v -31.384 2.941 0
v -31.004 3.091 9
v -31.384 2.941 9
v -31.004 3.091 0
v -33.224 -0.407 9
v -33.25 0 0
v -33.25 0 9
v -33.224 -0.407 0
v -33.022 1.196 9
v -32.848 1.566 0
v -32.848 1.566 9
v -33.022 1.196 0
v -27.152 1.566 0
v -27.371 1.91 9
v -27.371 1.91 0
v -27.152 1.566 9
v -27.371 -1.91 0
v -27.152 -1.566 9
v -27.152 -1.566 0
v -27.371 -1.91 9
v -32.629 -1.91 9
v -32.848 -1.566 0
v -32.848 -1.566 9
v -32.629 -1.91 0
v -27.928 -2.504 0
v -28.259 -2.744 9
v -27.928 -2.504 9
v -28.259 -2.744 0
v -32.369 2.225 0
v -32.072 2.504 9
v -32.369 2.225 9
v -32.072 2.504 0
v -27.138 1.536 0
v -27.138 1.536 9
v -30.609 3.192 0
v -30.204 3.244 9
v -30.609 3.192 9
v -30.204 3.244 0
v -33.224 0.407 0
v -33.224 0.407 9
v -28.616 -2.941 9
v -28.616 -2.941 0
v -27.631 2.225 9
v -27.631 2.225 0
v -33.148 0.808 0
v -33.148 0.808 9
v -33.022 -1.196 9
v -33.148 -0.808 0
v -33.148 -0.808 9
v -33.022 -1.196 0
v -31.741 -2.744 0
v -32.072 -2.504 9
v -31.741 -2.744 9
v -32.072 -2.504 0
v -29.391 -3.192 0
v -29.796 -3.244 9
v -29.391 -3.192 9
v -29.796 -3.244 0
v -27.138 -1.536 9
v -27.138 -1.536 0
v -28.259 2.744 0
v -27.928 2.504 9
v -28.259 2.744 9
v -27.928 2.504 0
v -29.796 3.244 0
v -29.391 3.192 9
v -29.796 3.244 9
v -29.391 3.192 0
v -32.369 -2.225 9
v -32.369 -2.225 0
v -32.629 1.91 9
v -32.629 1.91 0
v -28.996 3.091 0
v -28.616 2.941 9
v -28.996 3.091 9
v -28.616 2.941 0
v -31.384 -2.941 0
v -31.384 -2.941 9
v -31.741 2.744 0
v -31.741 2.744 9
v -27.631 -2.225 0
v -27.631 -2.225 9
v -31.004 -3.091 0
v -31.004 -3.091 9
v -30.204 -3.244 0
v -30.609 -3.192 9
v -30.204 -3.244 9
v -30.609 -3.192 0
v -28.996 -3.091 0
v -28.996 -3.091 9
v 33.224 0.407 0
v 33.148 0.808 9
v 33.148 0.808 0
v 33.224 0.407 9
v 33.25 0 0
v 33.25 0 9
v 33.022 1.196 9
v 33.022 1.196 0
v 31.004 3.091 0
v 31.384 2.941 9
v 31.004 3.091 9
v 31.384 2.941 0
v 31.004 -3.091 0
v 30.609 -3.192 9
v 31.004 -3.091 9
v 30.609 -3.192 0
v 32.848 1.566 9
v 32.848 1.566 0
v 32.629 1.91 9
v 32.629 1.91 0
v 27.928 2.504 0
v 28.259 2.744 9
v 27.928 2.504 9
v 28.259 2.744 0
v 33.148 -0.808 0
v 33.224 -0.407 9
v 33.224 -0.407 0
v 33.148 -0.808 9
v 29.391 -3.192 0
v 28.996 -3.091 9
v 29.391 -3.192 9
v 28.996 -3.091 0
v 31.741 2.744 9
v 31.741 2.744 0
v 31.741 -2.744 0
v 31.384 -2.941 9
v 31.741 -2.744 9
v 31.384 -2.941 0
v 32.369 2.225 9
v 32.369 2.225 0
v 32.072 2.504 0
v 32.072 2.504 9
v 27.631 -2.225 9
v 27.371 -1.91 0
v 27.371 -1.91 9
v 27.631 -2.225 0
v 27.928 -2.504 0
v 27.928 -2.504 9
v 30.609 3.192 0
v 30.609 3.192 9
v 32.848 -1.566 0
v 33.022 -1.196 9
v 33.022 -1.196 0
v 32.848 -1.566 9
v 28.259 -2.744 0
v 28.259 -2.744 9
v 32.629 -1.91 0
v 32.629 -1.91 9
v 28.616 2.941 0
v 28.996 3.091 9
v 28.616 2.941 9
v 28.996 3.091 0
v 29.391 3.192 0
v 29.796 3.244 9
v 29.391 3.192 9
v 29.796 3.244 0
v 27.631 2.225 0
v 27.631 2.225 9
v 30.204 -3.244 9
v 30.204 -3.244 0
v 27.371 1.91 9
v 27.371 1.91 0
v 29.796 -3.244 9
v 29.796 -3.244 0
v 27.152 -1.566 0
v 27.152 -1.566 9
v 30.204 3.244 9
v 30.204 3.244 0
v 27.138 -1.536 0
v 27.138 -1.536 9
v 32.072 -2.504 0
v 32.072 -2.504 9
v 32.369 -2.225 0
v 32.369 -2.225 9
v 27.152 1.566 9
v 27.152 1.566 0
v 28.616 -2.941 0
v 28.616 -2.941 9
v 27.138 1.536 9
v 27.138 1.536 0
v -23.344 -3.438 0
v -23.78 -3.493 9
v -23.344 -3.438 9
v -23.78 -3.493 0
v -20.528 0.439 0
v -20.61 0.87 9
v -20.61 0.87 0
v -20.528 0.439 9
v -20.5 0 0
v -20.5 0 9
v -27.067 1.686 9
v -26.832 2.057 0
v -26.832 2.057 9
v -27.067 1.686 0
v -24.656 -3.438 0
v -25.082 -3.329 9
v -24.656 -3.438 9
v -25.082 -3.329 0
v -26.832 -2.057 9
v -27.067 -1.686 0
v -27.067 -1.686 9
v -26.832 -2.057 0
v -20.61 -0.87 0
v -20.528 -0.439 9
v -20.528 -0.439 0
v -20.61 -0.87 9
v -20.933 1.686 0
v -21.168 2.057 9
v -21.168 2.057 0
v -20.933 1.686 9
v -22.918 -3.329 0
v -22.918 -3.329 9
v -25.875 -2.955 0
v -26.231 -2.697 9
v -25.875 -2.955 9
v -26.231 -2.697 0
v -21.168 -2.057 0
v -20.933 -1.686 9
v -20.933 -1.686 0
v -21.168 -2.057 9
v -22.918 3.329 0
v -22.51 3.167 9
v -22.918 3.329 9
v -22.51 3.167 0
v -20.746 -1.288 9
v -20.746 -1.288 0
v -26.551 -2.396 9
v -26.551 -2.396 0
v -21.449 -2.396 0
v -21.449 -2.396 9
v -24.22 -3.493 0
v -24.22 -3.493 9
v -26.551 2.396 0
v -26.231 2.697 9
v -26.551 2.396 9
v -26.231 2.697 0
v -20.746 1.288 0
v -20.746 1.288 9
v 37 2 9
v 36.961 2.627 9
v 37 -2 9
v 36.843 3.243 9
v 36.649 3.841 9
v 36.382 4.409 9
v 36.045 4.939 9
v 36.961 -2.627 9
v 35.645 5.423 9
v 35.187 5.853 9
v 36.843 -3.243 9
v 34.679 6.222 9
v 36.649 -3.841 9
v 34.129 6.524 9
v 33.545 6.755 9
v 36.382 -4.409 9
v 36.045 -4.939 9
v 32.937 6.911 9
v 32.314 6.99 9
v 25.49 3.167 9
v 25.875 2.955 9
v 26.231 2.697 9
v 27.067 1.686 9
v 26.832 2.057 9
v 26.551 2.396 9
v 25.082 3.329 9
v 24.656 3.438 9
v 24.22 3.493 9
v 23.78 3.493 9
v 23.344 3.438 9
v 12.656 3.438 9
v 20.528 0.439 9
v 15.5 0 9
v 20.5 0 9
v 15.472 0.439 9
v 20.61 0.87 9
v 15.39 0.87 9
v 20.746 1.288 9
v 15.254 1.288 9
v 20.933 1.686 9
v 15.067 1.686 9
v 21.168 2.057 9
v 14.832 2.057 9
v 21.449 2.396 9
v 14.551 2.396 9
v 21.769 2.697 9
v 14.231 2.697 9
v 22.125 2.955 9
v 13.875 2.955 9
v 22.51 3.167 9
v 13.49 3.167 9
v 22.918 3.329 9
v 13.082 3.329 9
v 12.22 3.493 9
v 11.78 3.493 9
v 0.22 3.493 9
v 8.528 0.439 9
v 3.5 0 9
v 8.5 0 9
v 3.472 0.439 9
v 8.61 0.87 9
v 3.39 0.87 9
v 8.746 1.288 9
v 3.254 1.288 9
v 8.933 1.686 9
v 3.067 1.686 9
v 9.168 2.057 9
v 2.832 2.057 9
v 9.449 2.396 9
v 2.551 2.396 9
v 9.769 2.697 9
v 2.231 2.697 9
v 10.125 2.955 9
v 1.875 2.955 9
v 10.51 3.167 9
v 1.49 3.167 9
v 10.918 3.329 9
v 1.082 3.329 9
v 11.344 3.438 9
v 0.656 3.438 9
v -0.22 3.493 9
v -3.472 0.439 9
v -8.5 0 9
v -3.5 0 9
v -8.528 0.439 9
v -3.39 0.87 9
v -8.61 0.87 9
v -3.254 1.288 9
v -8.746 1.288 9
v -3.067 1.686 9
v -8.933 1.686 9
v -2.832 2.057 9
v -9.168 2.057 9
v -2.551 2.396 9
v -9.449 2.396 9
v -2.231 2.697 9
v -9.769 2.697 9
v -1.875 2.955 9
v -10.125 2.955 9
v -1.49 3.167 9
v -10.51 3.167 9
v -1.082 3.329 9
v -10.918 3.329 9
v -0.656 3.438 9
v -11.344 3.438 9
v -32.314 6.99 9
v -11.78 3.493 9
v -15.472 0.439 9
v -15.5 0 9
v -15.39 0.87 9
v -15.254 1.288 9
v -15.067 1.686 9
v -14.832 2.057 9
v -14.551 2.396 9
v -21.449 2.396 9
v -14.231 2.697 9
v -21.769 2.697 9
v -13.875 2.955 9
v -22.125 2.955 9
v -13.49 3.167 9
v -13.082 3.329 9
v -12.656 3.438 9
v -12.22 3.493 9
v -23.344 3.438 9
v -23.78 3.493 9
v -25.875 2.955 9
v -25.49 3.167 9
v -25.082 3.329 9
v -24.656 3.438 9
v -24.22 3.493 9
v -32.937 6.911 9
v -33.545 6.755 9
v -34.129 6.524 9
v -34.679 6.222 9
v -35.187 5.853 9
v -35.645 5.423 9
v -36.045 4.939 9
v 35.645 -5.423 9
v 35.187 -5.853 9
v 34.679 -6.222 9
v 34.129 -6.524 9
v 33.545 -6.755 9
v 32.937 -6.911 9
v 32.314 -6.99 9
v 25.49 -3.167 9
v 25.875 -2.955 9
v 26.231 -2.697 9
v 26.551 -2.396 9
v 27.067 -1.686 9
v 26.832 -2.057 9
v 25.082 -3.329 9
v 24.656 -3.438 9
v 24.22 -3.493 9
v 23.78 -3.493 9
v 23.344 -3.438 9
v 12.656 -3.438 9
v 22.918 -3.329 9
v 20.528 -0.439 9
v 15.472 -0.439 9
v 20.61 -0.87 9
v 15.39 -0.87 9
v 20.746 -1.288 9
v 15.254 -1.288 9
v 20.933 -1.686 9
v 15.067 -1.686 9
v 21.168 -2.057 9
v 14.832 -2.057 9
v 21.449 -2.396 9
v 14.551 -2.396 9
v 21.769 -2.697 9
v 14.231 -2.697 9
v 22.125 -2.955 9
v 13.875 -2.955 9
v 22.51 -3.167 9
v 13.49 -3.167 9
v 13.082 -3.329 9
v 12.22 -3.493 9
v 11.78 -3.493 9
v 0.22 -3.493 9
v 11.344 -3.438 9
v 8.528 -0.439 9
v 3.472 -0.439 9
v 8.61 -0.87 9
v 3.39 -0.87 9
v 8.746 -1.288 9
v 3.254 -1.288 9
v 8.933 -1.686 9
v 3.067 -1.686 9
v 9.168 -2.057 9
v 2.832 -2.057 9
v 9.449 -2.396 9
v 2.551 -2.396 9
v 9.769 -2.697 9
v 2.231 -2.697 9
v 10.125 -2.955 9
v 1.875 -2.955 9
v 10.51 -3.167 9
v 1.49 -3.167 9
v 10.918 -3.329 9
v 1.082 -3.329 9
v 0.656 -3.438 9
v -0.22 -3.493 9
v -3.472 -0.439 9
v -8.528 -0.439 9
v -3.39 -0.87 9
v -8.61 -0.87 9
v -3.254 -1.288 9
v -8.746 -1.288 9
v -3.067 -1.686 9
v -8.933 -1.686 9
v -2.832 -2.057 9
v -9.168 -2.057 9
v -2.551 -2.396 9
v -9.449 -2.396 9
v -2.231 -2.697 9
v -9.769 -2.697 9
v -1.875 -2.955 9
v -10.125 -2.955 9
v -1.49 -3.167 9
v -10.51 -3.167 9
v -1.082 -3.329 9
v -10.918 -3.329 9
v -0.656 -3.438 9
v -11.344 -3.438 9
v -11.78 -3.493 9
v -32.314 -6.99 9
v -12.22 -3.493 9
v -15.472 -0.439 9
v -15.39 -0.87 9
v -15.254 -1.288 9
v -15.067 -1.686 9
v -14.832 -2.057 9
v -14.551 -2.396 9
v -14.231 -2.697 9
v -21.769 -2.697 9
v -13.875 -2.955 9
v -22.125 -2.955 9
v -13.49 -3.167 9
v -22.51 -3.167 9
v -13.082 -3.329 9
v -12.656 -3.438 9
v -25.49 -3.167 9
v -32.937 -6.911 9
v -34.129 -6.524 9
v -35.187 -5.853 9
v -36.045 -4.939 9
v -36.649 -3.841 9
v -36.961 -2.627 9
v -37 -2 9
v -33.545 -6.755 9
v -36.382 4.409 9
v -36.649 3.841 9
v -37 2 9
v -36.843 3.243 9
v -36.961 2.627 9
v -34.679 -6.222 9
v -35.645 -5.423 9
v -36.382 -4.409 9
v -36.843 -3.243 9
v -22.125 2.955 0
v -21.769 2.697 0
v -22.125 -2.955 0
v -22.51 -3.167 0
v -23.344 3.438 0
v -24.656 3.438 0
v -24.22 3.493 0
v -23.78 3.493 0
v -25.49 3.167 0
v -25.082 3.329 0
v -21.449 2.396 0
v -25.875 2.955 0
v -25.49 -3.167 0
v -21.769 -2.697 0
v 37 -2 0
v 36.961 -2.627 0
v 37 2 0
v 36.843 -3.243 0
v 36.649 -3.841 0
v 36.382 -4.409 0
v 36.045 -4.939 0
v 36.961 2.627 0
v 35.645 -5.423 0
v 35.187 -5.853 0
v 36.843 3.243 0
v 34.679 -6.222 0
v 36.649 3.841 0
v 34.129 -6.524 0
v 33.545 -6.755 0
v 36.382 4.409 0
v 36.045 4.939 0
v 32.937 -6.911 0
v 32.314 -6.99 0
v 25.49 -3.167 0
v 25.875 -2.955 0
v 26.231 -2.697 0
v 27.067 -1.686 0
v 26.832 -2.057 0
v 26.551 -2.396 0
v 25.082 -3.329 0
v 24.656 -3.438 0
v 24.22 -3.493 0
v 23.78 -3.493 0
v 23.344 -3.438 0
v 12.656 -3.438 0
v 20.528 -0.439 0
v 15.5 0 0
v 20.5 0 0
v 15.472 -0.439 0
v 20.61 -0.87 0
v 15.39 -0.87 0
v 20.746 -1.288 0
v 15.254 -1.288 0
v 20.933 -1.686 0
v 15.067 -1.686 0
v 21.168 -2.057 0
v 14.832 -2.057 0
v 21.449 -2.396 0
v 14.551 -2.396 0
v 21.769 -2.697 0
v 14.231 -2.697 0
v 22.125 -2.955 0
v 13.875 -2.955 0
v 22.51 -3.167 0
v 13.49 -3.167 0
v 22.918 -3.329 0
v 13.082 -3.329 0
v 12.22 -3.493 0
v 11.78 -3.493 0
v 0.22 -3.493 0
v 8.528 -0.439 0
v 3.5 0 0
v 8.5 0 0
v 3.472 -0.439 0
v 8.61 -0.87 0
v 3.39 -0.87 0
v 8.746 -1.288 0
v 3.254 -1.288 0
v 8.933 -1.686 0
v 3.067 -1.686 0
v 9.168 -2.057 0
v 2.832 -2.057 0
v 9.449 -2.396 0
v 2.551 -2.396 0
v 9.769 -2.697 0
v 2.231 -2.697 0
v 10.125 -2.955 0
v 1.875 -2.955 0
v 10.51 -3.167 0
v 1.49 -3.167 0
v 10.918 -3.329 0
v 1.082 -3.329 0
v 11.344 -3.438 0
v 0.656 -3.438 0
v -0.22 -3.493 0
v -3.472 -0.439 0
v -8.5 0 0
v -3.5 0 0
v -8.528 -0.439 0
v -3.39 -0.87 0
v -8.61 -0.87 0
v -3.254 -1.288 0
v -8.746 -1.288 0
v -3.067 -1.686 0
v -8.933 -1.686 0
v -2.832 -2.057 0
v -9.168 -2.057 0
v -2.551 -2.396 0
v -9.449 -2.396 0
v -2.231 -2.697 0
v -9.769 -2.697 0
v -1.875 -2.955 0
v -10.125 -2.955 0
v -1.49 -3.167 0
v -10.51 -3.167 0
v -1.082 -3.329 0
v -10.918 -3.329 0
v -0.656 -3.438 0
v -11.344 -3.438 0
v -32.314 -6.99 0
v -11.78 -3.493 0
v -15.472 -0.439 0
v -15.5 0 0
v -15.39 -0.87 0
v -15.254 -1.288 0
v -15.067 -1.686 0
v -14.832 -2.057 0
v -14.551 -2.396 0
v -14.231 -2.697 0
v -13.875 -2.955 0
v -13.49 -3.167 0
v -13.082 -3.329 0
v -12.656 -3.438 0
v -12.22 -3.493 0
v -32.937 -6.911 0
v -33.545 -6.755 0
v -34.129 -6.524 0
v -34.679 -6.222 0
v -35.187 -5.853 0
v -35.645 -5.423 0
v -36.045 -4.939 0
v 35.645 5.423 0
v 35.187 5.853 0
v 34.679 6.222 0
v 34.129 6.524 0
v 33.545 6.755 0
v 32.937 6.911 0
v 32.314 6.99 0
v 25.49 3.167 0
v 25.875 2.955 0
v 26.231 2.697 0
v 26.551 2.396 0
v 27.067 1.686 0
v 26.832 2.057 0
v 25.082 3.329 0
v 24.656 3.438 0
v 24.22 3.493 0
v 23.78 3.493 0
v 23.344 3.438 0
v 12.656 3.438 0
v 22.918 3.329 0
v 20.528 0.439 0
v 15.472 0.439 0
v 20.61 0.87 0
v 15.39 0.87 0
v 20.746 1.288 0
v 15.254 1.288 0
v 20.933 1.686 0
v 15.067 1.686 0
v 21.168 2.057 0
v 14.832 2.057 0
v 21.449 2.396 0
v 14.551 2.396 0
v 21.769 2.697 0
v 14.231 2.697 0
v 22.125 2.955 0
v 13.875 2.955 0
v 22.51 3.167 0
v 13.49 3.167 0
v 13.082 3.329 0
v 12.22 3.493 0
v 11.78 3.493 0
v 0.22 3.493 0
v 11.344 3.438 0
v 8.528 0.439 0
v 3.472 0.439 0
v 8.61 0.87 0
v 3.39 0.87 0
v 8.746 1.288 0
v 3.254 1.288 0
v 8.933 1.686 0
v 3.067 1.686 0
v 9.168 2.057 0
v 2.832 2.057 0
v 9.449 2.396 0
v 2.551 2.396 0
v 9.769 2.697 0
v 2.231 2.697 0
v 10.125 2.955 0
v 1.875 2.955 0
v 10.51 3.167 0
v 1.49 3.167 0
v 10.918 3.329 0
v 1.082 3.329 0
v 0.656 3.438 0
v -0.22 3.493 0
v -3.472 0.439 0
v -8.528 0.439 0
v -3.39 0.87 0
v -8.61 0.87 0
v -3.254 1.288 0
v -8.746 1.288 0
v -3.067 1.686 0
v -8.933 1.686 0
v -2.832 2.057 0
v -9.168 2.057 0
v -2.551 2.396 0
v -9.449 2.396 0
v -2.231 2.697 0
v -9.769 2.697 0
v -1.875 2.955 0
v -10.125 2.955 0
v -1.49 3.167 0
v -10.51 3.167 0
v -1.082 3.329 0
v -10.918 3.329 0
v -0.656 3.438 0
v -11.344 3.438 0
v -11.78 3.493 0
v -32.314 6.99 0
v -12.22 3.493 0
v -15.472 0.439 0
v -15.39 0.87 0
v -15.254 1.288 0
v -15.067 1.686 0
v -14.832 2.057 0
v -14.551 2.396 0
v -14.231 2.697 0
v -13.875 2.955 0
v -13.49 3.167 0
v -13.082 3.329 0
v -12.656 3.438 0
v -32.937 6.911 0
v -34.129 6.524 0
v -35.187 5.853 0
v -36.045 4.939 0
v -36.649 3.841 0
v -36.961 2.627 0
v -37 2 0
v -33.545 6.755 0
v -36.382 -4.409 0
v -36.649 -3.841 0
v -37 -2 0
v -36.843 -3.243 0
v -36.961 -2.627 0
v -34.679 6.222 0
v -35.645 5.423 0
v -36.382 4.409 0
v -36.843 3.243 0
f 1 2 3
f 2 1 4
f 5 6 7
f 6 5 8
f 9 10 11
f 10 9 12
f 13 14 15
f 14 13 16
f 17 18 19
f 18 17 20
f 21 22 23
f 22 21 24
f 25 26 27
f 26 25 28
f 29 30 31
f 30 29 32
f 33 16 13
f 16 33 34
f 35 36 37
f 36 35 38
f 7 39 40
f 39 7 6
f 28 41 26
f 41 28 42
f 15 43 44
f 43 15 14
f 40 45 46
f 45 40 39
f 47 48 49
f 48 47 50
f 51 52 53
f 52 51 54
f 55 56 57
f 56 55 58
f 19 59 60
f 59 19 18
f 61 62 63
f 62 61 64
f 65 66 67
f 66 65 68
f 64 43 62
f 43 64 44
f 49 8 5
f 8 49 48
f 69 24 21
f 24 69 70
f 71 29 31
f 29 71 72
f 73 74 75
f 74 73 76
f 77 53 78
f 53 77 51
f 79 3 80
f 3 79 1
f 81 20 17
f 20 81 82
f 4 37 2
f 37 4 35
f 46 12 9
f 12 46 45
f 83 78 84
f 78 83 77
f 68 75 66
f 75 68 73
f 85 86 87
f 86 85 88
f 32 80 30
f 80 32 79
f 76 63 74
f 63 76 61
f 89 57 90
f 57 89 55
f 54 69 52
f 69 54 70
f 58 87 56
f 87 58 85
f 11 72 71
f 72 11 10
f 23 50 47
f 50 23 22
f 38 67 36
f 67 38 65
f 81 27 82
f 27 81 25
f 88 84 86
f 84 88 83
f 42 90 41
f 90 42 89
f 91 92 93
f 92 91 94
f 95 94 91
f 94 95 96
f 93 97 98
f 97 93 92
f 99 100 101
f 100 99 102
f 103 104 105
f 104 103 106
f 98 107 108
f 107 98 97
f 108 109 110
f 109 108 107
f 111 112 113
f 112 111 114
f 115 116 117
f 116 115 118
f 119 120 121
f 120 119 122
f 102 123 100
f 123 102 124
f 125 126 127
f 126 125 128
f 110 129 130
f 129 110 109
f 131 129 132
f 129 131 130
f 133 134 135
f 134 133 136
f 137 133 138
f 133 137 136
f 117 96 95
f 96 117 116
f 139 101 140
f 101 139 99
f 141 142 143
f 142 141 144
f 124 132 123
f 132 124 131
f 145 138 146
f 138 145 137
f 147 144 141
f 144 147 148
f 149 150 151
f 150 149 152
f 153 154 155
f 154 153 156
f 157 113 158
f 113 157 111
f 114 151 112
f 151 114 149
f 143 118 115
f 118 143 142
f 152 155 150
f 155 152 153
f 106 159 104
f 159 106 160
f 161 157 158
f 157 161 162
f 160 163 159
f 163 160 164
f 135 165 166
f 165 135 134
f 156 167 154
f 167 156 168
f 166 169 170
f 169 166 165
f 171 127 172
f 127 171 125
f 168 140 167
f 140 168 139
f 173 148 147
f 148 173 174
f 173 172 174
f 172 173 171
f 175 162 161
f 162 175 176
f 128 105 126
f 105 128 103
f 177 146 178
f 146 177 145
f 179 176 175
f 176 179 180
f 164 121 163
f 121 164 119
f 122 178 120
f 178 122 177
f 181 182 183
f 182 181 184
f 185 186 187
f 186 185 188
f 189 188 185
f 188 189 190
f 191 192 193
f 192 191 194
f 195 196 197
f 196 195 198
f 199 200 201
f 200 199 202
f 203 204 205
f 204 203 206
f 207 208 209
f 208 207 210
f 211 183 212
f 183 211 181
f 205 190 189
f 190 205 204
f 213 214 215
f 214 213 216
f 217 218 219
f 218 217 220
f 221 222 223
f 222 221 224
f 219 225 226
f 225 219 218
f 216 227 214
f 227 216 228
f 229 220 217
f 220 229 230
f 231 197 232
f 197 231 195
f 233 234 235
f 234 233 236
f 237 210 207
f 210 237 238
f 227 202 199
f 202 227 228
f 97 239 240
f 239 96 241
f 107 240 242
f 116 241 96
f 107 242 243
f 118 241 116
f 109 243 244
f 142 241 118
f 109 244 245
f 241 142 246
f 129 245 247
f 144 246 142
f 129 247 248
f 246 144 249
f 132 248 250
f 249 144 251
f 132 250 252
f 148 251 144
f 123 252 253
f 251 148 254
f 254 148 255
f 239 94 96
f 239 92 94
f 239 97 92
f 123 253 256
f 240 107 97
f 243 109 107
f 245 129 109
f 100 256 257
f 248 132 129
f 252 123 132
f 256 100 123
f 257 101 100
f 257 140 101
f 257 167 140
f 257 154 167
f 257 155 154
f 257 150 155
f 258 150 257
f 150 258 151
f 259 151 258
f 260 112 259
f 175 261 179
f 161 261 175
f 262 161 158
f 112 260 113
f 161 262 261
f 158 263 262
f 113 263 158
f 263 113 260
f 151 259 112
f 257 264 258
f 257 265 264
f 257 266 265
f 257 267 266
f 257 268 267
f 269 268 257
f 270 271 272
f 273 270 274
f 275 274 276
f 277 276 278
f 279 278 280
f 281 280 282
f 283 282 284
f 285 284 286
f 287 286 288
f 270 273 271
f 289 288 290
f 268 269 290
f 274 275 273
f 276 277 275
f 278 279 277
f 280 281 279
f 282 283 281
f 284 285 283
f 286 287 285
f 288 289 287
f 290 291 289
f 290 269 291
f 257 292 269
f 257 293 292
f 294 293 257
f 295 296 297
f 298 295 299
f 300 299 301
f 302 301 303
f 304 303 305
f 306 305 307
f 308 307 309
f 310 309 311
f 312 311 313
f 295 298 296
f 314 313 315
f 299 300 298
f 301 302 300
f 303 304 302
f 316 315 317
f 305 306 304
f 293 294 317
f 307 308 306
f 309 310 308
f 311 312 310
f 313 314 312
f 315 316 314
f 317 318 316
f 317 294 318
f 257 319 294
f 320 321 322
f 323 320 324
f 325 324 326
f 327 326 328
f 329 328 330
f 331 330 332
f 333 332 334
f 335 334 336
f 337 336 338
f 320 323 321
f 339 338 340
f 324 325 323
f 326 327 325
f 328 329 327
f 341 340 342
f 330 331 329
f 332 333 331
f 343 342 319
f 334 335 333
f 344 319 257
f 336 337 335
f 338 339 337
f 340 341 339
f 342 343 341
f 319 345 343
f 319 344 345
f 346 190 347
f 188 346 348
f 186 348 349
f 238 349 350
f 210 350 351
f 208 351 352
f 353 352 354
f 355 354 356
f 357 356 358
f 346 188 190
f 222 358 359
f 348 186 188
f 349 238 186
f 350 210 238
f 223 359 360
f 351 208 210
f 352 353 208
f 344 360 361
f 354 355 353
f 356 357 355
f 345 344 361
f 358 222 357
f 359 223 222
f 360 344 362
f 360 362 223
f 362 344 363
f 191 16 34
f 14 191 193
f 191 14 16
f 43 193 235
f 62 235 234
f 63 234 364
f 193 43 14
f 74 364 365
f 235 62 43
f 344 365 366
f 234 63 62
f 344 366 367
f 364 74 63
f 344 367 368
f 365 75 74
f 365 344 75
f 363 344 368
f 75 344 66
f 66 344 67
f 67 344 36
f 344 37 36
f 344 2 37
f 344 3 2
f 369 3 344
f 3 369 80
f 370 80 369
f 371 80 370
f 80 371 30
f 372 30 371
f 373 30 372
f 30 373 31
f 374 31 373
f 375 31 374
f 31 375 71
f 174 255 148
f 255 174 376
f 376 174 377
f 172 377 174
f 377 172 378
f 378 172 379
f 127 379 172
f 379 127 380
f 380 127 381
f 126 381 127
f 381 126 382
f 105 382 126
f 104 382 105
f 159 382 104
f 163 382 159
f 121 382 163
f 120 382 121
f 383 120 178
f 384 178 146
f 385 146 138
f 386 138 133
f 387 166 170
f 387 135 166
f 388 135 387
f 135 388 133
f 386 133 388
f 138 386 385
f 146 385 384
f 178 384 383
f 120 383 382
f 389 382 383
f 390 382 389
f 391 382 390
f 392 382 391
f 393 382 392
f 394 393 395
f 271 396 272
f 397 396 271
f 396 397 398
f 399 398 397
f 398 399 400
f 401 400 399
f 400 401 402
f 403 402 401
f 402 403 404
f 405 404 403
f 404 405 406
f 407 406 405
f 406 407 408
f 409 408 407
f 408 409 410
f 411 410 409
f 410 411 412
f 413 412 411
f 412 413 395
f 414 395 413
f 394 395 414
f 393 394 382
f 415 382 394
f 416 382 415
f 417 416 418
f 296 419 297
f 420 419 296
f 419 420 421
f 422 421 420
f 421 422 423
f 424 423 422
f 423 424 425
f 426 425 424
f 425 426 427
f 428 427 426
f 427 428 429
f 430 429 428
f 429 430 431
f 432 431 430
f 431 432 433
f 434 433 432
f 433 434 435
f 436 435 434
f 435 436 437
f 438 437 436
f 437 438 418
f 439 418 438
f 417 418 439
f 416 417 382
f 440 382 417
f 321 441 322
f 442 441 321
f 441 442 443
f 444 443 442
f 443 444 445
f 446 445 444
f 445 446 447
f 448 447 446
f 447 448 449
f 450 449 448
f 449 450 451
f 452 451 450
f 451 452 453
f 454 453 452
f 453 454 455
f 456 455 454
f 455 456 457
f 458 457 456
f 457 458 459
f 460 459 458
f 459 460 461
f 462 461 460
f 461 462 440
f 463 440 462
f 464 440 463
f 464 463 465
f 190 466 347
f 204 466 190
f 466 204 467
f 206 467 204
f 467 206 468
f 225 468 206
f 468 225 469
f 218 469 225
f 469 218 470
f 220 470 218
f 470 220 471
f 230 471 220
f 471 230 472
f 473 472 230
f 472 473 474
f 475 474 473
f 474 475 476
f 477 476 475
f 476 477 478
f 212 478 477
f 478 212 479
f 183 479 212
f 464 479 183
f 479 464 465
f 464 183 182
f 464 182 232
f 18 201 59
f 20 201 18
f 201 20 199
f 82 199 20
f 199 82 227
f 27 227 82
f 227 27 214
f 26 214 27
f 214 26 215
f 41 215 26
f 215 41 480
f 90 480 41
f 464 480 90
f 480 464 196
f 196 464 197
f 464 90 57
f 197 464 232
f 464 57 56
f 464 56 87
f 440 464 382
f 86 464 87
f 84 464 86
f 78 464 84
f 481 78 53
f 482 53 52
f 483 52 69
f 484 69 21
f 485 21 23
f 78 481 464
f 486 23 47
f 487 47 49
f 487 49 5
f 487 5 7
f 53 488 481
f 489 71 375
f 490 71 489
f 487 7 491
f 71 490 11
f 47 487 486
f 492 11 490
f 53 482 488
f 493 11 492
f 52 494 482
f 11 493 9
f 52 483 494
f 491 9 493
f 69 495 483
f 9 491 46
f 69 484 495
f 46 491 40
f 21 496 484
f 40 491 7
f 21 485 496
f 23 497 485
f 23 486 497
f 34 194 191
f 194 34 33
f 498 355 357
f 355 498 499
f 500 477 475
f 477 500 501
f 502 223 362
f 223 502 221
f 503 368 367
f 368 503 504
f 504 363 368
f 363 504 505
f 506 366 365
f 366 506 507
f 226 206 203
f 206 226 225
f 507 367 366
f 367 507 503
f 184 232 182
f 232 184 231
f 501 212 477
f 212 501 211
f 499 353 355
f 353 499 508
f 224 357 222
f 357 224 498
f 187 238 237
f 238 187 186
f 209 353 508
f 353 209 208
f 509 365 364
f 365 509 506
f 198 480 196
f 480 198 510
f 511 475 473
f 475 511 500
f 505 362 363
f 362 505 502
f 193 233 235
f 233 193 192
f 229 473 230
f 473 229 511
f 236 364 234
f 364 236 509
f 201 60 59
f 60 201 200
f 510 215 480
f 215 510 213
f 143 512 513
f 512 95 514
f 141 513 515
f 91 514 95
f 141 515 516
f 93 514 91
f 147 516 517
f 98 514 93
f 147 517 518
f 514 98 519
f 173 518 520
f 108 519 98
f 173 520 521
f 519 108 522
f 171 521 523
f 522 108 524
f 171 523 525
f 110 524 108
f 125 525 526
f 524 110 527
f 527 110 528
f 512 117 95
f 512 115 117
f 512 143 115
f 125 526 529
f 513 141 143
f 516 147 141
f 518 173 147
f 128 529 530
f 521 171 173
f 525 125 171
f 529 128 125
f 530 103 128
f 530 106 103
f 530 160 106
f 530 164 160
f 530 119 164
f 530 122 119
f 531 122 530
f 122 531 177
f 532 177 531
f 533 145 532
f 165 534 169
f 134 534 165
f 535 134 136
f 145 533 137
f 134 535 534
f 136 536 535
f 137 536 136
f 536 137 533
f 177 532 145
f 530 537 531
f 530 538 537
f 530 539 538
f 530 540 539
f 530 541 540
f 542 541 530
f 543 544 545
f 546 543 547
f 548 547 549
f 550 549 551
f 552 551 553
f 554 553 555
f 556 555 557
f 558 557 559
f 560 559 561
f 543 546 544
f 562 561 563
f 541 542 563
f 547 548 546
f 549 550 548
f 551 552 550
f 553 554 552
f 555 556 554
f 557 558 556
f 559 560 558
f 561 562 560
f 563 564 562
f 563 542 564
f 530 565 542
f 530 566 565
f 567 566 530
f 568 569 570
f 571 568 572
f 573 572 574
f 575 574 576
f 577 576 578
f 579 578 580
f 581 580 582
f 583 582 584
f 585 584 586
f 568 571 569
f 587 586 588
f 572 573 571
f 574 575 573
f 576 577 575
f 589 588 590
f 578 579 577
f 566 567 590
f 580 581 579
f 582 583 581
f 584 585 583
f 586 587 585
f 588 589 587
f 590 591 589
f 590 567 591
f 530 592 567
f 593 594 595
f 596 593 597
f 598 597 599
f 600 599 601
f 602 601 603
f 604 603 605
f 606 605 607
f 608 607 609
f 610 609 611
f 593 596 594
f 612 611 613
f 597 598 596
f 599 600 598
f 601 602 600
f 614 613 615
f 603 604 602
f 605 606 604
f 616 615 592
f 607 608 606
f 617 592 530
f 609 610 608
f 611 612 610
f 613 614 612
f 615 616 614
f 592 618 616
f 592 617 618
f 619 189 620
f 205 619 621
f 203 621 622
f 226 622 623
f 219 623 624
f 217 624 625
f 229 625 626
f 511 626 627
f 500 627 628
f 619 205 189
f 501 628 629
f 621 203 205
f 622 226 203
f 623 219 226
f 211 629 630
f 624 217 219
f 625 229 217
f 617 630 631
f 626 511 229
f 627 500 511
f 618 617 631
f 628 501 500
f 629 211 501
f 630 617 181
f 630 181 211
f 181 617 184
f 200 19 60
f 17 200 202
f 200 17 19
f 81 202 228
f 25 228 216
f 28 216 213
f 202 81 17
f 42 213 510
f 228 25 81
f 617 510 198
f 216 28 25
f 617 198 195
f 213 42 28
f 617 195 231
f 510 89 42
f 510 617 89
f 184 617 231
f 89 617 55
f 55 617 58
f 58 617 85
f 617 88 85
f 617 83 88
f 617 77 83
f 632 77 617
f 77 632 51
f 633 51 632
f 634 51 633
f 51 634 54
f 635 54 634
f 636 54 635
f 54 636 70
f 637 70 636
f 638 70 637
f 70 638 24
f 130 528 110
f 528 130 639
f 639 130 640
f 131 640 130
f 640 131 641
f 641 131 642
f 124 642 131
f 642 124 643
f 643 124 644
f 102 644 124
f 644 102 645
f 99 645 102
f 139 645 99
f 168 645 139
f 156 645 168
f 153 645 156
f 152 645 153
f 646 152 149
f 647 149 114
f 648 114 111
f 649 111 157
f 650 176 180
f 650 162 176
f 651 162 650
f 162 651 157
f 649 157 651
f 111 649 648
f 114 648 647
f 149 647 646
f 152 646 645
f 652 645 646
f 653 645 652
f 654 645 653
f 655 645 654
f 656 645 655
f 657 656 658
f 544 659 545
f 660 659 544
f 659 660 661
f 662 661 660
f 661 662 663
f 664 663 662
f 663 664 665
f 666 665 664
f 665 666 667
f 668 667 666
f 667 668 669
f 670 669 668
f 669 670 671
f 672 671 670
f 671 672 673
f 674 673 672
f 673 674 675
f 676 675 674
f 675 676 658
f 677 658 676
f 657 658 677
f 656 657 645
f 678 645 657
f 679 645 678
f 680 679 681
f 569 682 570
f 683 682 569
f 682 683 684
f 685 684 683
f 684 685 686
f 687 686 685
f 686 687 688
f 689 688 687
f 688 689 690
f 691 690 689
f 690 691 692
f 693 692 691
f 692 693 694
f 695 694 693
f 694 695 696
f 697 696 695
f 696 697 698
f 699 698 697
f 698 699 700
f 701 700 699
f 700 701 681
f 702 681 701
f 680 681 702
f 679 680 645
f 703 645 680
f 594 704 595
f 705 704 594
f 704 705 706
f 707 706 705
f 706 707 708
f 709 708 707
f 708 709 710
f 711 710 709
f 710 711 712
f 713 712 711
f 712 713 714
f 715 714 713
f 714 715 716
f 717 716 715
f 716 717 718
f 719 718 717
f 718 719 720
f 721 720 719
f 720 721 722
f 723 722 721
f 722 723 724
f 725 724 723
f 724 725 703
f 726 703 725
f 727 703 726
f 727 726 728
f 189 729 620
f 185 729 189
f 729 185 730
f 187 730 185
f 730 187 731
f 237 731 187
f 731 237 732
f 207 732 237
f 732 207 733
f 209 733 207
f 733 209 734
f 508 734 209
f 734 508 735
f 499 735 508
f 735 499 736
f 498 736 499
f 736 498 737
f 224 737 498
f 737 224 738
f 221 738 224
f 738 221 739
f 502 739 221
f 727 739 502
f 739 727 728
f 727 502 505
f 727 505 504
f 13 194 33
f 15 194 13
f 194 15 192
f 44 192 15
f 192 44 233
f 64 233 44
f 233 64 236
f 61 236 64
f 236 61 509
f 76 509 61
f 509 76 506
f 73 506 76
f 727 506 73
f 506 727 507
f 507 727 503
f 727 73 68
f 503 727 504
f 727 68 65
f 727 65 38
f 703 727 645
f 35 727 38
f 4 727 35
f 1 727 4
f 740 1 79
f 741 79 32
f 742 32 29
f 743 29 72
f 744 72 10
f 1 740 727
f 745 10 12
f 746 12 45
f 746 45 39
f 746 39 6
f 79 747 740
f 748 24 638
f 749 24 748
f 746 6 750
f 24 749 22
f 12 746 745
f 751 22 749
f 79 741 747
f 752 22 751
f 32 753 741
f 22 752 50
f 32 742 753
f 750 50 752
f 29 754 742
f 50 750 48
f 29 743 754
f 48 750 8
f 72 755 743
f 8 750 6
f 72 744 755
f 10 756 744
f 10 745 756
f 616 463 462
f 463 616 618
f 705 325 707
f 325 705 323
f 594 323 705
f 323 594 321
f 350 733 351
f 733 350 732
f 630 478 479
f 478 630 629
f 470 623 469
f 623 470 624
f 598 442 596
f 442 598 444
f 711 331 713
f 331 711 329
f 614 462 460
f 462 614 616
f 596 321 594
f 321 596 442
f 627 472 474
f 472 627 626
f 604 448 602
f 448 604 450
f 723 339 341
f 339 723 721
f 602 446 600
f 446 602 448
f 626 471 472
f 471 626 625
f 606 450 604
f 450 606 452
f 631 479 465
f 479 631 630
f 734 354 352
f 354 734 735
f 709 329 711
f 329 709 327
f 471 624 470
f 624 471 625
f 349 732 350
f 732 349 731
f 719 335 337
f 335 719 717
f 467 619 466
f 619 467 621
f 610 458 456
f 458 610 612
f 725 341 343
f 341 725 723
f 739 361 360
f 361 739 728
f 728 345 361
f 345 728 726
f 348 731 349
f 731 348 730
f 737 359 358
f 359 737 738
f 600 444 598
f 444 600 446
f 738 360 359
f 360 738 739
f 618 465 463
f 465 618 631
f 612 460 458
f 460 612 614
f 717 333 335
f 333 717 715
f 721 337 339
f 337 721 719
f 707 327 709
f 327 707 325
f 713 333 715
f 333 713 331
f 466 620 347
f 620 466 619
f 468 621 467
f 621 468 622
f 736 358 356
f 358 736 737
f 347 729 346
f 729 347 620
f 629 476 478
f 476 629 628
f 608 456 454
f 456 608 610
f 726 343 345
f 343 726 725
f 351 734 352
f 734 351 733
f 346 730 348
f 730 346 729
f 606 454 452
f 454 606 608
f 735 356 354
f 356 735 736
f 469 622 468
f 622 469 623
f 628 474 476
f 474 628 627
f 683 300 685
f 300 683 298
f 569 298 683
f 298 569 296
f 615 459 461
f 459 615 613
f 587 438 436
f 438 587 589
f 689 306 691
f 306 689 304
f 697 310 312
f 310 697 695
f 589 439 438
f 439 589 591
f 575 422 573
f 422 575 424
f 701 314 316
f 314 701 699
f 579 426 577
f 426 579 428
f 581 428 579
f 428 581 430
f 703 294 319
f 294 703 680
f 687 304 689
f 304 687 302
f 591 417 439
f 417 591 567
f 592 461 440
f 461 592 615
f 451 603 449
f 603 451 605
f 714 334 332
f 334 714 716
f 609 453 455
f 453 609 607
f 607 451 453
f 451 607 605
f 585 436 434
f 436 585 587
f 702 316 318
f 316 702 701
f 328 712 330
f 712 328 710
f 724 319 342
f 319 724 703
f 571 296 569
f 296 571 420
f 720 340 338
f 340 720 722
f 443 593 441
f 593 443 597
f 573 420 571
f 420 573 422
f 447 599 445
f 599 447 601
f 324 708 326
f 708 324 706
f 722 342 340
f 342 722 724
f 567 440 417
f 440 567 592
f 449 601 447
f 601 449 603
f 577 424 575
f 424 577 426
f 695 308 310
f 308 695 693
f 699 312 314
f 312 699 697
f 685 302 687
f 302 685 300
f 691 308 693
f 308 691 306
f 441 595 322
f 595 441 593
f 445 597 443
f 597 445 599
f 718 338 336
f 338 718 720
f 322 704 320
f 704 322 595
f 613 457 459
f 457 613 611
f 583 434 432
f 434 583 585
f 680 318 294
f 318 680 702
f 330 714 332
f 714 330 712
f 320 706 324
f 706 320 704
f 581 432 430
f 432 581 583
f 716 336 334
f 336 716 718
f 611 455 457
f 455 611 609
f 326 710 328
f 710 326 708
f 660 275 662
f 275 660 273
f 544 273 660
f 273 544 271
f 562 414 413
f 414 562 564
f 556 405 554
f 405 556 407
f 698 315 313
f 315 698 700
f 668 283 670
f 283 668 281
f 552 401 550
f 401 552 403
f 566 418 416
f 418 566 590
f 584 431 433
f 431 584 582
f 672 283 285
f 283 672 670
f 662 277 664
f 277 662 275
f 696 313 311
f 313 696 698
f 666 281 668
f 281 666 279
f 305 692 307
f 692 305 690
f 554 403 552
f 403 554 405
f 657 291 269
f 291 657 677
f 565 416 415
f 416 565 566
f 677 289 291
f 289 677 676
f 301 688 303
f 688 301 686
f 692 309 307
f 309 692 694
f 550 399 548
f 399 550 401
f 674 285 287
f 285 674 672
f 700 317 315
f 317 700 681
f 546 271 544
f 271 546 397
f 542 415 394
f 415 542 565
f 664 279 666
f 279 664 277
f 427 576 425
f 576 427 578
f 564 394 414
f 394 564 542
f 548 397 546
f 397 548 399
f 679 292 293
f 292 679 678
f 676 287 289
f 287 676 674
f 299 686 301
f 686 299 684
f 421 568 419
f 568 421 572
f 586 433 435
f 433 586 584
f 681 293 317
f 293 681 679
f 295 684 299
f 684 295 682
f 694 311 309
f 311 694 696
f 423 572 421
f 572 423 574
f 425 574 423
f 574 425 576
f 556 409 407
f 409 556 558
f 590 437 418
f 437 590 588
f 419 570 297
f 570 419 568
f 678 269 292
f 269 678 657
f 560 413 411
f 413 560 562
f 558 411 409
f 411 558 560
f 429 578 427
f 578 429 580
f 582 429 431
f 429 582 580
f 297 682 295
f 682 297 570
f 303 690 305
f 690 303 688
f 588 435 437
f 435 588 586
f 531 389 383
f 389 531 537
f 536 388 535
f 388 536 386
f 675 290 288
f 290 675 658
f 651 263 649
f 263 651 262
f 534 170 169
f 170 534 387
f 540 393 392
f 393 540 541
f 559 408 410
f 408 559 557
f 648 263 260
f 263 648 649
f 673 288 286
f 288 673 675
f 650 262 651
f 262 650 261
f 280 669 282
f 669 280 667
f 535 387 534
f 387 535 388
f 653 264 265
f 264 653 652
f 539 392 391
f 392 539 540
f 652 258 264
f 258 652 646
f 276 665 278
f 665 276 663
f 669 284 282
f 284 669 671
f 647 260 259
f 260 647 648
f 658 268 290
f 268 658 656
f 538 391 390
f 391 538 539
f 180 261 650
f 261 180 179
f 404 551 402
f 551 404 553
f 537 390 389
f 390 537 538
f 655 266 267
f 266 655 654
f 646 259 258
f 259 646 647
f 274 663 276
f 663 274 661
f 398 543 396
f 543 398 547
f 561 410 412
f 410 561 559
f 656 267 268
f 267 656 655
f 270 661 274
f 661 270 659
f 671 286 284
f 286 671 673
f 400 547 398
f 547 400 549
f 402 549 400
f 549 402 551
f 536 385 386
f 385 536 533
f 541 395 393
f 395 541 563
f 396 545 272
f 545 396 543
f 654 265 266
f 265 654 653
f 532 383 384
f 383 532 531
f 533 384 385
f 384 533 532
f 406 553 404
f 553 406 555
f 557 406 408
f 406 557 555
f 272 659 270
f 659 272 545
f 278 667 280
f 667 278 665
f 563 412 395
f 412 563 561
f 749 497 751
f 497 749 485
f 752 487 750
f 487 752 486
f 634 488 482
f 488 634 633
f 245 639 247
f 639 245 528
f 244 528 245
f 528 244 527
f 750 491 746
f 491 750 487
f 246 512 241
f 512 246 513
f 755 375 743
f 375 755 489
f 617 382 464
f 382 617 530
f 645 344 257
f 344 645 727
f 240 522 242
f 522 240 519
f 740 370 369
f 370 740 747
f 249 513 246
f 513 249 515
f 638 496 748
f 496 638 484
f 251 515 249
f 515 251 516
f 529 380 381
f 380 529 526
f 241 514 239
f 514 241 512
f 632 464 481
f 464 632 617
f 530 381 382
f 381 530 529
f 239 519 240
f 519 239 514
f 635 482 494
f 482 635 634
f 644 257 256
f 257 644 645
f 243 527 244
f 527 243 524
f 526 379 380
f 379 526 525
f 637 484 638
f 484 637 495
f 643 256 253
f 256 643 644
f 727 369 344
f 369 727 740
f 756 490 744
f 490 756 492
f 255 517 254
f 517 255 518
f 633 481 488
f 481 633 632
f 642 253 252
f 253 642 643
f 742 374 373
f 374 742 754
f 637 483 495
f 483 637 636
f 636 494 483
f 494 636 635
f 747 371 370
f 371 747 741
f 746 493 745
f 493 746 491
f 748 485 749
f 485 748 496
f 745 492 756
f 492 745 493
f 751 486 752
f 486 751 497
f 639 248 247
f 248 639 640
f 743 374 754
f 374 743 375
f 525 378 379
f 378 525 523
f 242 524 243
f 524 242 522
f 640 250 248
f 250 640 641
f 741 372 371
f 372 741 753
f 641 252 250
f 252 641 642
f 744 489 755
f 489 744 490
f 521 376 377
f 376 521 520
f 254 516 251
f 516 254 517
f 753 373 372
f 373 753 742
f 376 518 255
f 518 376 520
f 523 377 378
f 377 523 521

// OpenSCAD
$fn = 50;


difference() {
	union() {
		hull() {
			translate(v = [-32.0000000000, 2.0000000000, 0]) {
				cylinder(h = 9, r = 5);
			}
			translate(v = [32.0000000000, 2.0000000000, 0]) {
				cylinder(h = 9, r = 5);
			}
			translate(v = [-32.0000000000, -2.0000000000, 0]) {
				cylinder(h = 9, r = 5);
			}
			translate(v = [32.0000000000, -2.0000000000, 0]) {
				cylinder(h = 9, r = 5);
			}
		}
	}
	union() {
		#translate(v = [-30.0000000000, 0.0000000000, -100.0000000000]) {
			cylinder(h = 200, r = 3.2500000000);
		}
		#translate(v = [-30.0000000000, 0.0000000000, -100.0000000000]) {
			cylinder(h = 200, r = 3.2500000000);
		}
		#translate(v = [30.0000000000, 0.0000000000, -100.0000000000]) {
			cylinder(h = 200, r = 3.2500000000);
		}
		#translate(v = [30.0000000000, 0.0000000000, -100.0000000000]) {
			cylinder(h = 200, r = 3.2500000000);
		}
		#translate(v = [-24.0000000000, 0, 0]) {
			cylinder(h = 9, r = 3.5000000000);
		}
		#translate(v = [-12.0000000000, 0, 0]) {
			cylinder(h = 9, r = 3.5000000000);
		}
		#cylinder(h = 9, r = 3.5000000000);
		#translate(v = [12.0000000000, 0, 0]) {
			cylinder(h = 9, r = 3.5000000000);
		}
		#translate(v = [24.0000000000, 0, 0]) {
			cylinder(h = 9, r = 3.5000000000);
		}
	}
}
